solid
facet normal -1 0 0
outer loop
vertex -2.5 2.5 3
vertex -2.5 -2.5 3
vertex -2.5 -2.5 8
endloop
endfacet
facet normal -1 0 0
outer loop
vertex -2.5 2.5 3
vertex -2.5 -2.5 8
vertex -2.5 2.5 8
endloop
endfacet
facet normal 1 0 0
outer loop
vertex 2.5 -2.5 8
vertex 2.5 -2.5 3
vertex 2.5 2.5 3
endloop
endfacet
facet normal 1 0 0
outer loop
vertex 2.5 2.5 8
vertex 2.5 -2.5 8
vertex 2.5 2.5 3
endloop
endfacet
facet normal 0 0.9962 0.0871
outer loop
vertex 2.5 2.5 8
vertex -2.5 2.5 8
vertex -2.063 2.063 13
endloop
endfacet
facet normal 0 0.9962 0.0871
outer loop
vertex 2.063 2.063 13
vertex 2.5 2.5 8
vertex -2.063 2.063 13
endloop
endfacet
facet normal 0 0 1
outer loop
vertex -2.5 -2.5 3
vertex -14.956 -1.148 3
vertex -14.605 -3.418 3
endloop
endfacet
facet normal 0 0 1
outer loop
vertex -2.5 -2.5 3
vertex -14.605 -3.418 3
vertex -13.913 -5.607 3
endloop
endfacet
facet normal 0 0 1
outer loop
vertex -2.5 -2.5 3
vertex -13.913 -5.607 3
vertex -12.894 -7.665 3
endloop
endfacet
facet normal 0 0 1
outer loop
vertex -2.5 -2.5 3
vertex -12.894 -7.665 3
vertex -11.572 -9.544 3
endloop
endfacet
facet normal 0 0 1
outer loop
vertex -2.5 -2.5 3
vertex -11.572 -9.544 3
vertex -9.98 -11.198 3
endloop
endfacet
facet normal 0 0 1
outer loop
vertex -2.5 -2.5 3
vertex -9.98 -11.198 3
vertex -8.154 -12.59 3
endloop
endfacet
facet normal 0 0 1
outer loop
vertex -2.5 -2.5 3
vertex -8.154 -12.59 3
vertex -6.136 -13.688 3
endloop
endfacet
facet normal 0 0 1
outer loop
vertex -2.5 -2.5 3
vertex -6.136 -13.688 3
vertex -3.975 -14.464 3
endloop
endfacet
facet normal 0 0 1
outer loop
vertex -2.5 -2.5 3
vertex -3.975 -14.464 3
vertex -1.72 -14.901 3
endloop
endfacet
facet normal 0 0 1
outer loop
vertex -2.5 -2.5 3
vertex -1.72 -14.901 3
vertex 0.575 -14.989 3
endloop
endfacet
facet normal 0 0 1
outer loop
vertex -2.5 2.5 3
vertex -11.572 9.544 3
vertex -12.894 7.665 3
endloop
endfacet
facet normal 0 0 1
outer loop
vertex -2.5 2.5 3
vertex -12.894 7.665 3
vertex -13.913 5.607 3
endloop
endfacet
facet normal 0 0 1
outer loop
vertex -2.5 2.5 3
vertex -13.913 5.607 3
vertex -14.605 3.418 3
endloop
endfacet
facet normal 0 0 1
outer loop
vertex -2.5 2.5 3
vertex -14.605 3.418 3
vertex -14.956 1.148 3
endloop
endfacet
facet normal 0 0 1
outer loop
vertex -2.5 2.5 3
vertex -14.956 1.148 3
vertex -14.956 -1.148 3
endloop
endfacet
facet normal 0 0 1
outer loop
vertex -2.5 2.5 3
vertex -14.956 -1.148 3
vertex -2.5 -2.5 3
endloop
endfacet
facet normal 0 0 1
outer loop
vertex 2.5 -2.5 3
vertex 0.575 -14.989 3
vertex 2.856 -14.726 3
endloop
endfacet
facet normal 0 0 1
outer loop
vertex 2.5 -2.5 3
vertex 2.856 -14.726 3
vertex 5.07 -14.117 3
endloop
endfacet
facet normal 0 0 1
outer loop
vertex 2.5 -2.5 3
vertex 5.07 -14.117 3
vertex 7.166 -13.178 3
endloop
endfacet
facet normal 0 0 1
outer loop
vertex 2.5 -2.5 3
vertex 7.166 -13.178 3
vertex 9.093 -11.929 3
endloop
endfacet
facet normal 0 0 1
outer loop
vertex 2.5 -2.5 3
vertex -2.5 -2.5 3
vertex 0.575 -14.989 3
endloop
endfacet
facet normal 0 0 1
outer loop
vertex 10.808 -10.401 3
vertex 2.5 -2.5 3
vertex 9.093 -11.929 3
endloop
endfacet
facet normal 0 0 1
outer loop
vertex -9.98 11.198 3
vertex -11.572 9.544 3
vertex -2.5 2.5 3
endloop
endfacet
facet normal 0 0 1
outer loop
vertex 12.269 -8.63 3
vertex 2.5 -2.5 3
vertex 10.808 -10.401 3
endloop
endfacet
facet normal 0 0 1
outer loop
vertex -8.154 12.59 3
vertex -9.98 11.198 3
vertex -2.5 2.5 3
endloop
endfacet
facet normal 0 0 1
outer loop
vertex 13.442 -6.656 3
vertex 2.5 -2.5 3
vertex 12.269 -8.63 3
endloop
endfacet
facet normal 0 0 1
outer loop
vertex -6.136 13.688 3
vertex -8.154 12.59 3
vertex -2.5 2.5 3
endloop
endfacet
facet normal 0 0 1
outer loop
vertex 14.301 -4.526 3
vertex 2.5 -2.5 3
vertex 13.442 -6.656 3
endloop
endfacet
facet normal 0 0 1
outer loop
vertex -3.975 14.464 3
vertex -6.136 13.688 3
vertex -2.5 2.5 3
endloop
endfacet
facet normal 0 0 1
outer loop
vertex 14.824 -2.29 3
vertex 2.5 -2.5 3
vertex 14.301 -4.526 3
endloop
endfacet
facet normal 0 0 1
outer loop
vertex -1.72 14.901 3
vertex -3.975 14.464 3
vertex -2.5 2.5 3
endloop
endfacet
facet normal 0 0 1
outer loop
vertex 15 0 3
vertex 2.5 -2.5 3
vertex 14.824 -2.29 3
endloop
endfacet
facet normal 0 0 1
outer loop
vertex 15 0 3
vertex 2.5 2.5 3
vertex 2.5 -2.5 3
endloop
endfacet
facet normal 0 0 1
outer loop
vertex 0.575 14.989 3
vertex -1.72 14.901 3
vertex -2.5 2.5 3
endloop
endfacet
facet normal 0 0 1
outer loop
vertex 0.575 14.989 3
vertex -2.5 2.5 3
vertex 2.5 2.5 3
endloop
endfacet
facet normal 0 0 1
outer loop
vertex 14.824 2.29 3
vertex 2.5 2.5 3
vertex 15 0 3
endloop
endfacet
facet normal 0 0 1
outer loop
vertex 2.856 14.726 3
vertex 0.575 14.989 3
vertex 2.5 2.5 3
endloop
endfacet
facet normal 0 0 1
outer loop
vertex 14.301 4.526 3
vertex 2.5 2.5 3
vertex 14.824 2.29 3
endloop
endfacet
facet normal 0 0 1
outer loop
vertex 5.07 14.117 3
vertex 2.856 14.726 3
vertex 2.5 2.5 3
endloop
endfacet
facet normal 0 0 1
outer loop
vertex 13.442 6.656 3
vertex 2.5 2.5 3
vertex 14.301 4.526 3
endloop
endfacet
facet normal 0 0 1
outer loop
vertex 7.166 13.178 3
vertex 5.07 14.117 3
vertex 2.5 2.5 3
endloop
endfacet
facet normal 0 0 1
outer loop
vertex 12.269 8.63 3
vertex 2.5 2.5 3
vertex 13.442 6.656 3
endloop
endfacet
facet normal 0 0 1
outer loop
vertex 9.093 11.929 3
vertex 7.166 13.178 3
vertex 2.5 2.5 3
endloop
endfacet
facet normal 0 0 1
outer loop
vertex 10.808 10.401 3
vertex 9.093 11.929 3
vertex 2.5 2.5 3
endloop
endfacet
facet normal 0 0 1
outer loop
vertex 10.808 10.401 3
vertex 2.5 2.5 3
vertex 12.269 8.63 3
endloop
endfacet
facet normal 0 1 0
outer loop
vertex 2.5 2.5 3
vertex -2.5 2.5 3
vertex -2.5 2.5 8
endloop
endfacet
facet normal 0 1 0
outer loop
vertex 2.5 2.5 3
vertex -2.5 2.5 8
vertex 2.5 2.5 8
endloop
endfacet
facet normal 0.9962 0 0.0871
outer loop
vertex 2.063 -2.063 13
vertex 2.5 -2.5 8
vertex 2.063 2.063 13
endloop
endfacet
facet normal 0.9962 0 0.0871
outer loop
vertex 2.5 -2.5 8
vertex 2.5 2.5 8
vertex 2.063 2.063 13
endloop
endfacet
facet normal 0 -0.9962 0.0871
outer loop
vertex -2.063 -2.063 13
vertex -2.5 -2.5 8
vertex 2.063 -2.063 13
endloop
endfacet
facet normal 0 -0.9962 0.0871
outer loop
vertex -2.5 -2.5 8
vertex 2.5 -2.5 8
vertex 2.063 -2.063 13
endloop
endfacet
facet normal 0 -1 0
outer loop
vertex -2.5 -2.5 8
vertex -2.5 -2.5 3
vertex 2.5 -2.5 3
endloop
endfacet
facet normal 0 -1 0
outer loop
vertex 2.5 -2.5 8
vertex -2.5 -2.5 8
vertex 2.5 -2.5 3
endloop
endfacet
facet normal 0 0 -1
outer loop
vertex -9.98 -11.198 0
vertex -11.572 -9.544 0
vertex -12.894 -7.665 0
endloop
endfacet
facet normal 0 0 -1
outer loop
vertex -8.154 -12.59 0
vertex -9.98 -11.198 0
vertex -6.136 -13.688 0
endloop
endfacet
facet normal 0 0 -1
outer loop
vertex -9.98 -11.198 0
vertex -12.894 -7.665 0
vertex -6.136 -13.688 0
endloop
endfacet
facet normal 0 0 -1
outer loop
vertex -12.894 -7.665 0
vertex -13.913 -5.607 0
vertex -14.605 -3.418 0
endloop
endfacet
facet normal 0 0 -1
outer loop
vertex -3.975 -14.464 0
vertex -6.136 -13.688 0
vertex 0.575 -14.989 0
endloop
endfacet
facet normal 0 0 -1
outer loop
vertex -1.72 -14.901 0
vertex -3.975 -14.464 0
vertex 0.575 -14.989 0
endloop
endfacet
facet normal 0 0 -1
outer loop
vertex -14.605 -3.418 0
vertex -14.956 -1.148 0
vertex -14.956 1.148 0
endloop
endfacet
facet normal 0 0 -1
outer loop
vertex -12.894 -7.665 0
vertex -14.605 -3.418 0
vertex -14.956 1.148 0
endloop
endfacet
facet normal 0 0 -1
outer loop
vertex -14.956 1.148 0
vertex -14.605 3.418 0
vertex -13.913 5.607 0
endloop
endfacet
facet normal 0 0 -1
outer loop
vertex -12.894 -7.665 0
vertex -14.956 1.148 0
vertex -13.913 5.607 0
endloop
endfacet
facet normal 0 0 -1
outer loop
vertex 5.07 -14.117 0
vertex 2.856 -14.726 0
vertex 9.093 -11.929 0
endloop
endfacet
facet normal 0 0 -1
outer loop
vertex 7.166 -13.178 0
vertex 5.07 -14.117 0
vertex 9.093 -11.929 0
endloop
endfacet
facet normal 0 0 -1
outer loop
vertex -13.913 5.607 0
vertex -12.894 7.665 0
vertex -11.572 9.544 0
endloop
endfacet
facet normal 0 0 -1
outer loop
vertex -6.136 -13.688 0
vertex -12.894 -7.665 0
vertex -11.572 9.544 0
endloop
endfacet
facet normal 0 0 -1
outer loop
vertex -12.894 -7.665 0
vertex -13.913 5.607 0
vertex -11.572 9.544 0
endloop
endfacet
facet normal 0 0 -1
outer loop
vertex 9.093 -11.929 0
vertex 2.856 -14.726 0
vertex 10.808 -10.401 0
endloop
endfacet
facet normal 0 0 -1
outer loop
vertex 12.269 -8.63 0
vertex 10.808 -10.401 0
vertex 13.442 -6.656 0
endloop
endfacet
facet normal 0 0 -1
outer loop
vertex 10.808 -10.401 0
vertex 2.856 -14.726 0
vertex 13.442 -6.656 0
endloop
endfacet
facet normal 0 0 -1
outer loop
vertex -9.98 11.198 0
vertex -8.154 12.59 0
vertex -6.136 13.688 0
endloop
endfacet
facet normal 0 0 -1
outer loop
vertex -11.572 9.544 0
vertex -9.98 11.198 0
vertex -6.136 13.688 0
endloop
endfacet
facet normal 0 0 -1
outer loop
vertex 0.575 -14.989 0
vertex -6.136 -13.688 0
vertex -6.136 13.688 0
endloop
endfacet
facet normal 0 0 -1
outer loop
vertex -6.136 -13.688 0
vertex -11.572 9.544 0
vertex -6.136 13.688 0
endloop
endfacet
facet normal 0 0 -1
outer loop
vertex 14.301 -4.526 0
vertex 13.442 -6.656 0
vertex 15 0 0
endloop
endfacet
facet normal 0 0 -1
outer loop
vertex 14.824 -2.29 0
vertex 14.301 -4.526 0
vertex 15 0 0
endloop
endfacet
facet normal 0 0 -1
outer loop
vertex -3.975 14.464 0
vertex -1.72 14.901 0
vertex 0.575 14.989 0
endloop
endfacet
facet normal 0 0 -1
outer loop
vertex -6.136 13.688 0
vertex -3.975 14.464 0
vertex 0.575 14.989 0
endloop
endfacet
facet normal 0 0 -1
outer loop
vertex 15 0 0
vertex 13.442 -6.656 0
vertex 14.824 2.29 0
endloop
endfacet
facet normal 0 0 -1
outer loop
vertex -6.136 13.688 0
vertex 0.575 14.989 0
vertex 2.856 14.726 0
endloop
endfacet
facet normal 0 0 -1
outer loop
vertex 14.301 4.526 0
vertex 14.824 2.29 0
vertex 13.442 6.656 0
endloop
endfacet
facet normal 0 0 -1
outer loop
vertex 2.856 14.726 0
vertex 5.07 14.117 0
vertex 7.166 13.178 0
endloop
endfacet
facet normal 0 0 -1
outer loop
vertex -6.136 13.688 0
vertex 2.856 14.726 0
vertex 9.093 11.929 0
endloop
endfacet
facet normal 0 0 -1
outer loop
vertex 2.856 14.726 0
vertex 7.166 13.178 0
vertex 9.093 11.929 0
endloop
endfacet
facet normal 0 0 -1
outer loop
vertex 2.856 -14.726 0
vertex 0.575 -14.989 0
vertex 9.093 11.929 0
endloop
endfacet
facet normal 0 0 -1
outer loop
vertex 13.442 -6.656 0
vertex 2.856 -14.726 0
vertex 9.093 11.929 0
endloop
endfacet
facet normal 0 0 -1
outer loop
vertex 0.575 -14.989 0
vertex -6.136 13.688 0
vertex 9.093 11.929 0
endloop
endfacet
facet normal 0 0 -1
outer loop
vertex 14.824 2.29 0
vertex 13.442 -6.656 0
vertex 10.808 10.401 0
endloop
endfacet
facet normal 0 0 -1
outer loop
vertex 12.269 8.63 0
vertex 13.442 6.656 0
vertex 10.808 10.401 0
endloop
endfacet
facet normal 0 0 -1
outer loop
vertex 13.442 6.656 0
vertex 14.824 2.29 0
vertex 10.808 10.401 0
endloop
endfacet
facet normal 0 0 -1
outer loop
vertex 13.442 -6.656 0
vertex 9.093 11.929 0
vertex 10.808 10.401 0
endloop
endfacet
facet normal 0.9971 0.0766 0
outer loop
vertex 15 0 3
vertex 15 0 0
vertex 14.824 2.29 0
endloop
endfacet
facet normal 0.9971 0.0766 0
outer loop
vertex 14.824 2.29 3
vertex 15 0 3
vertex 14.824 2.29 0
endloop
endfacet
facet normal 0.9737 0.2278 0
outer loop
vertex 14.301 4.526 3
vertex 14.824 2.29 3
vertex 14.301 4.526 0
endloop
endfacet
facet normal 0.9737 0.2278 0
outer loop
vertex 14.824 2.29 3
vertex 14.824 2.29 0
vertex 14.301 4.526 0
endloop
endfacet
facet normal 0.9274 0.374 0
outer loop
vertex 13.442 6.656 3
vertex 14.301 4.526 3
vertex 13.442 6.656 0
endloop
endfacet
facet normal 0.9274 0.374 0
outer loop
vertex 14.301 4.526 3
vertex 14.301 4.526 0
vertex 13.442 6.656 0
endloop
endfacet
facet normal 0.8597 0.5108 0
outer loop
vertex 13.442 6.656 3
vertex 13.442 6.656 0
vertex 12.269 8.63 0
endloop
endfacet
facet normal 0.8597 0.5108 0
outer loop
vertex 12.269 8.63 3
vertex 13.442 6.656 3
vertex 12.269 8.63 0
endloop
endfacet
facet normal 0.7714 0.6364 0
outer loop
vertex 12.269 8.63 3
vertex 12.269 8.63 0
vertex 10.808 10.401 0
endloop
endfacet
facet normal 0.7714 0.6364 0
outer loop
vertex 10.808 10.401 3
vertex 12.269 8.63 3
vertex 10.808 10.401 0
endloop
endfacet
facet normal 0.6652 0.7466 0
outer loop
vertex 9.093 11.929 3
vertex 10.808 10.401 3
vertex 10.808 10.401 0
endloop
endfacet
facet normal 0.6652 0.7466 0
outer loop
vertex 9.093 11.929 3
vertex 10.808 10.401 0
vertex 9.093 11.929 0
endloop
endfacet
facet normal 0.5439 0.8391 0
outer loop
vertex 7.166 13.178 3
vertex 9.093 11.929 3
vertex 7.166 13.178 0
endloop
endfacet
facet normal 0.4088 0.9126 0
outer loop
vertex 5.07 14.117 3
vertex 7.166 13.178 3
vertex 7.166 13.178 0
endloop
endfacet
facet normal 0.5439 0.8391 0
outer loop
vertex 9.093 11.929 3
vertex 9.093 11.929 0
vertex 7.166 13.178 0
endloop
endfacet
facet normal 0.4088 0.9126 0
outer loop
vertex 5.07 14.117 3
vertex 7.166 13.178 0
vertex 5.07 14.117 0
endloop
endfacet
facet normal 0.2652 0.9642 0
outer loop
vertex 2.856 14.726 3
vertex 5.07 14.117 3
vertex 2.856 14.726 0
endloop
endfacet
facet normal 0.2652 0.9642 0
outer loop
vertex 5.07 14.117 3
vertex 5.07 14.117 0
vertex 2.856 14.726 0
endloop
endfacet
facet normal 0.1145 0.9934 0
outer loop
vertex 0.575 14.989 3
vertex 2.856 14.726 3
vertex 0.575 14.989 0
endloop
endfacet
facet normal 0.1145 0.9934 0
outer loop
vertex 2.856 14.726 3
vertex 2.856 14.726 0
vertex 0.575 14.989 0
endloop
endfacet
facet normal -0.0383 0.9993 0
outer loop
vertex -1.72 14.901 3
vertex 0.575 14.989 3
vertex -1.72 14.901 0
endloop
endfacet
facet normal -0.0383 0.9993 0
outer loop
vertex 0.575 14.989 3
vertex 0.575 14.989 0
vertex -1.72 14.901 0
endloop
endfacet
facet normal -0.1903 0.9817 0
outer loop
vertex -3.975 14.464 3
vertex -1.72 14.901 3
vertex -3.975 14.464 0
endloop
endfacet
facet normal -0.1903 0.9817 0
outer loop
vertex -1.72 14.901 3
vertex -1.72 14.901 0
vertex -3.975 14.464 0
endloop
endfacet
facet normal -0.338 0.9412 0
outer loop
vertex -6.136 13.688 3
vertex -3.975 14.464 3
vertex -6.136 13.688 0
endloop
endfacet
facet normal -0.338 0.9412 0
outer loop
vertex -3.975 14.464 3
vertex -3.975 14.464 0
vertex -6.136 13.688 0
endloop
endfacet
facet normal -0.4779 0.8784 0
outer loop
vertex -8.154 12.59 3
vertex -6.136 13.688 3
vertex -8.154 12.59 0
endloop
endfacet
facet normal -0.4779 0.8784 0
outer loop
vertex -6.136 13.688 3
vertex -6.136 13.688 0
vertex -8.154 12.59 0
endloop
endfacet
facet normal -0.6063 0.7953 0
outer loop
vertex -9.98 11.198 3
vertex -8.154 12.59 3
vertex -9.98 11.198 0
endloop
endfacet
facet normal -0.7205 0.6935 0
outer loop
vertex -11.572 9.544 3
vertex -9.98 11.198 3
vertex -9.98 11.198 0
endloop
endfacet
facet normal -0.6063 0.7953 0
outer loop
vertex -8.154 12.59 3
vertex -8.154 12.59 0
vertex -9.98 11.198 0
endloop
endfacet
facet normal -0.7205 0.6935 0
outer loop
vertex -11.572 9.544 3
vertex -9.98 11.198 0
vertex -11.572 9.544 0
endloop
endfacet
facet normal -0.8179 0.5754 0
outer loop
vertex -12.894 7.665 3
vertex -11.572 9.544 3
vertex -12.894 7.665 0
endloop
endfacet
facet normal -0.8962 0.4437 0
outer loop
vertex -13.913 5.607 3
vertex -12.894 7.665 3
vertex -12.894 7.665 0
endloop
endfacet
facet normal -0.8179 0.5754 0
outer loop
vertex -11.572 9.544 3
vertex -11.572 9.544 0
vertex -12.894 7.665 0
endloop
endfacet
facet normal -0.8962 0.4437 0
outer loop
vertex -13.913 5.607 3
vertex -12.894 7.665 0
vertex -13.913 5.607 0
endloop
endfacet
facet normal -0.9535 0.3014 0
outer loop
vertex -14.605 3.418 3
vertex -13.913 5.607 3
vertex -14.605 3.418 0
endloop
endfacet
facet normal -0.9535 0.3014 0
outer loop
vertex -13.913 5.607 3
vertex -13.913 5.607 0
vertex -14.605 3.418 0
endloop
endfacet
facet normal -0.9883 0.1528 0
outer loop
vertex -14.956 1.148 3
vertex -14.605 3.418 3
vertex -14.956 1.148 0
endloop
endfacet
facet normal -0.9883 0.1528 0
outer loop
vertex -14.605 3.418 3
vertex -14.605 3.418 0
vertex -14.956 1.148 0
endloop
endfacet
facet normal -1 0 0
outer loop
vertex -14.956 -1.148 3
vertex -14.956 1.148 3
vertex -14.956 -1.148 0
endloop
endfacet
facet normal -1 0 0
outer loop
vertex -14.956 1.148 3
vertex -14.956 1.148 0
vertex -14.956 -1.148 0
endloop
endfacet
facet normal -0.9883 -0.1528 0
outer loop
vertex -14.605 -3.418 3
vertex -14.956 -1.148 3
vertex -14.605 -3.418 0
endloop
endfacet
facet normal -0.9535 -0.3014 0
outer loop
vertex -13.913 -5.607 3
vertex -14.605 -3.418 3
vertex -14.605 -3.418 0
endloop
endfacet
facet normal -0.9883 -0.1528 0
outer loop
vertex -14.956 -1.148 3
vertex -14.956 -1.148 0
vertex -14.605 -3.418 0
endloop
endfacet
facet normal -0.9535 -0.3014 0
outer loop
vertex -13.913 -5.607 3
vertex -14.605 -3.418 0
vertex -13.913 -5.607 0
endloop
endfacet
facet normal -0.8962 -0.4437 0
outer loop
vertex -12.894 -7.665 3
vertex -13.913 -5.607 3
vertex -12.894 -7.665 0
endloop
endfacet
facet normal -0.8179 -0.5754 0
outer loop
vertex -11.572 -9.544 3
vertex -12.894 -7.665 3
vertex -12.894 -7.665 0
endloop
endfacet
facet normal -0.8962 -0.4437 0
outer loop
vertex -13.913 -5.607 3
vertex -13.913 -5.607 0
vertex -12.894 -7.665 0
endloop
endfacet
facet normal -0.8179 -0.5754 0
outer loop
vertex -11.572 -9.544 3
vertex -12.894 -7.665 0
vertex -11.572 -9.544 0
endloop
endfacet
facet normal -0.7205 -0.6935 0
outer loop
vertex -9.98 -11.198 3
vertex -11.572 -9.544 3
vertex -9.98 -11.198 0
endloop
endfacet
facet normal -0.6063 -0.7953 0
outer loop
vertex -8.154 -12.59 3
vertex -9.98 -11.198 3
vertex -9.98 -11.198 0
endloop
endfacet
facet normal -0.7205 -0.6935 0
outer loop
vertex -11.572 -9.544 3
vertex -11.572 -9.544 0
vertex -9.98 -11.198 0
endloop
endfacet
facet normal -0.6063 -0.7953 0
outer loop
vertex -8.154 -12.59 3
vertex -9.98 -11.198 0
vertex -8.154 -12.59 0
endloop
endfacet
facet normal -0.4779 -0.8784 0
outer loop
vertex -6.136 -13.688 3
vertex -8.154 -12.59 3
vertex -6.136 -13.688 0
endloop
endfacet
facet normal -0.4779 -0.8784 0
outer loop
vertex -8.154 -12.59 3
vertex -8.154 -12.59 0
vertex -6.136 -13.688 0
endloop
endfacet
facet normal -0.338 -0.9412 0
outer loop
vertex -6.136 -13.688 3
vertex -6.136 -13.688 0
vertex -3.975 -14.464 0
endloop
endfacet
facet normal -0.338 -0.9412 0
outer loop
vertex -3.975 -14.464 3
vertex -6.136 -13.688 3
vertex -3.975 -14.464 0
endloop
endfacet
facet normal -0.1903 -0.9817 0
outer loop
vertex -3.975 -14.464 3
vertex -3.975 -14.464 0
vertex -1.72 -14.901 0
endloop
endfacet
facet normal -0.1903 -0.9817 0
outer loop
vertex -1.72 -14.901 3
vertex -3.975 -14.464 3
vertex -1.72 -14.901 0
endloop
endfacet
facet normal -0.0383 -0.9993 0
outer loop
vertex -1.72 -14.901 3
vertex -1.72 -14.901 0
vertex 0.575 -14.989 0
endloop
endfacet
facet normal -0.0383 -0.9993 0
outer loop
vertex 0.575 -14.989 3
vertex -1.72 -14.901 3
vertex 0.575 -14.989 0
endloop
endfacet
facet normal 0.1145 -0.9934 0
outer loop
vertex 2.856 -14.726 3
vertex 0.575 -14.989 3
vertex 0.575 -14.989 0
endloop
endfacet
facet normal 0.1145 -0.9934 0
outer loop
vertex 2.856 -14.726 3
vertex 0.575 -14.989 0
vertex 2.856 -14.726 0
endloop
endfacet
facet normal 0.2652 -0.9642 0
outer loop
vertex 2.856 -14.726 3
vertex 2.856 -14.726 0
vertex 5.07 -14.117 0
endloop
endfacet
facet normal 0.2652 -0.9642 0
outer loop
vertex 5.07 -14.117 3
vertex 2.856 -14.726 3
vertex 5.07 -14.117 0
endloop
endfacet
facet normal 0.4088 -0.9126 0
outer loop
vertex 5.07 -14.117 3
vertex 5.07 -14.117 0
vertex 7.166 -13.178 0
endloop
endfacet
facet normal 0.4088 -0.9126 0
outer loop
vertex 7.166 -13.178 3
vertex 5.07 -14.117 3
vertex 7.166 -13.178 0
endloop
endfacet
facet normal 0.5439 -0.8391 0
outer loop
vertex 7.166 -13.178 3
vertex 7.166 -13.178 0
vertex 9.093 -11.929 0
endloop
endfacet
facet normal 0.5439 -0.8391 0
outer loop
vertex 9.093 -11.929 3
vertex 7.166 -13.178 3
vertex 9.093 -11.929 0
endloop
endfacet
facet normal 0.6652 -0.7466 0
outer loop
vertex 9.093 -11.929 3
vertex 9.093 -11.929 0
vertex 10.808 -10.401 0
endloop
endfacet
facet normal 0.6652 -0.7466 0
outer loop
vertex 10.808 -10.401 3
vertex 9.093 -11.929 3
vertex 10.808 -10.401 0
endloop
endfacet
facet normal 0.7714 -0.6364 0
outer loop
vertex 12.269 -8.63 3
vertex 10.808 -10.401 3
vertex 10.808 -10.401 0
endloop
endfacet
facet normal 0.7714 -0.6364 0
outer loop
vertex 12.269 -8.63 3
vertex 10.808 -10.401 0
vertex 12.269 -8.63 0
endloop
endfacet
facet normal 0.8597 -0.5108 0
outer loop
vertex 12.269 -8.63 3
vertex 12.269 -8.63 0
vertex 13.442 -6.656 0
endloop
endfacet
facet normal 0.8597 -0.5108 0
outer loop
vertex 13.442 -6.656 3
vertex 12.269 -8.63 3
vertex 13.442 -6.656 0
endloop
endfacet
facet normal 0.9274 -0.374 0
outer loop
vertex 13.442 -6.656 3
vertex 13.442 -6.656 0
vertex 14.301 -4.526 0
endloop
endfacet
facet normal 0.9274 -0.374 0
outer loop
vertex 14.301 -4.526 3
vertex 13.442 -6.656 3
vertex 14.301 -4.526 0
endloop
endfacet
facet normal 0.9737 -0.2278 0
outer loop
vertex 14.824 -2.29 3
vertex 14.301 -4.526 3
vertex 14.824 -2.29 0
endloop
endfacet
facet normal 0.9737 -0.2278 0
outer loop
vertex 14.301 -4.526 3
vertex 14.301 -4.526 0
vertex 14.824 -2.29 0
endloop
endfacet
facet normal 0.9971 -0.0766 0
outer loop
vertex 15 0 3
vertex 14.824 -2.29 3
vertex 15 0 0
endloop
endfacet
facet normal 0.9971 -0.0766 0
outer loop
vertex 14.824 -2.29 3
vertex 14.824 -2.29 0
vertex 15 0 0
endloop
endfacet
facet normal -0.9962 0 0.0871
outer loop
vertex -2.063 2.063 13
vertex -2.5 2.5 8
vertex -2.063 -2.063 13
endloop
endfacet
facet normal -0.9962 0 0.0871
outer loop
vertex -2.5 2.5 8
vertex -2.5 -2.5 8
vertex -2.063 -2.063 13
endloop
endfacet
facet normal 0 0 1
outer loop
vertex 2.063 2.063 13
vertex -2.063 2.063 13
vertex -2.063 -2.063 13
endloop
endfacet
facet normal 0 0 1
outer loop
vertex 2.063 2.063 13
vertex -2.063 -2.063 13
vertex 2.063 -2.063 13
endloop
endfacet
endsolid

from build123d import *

# Parameters (mm, degrees)
F0_R      = 15
F0_W      = 5
F0_H      = 5
F1_DEPTH  = 3
F2_DEPTH  = 8
F2_FACE_W = 5
F2_FACE_H = 5
F3_DEPTH  = 5
F3_TAPER  = 5


with BuildPart() as f1:
    # F0 (on Top) → F1 (new body)
    with BuildSketch(Plane.XY):
        Circle(F0_R)
        Rectangle(F0_W, F0_H, mode=Mode.SUBTRACT)
    extrude(amount=F1_DEPTH)

    # F0 (on Top) → F2 (join)
    with BuildSketch(Plane.XY):
        Rectangle(F0_W, F0_H)
    extrude(amount=F2_DEPTH)

    # F2_face (on face) → F3 (join)
    with BuildSketch(Plane.XY.offset(8)):
        Rectangle(F2_FACE_W, F2_FACE_H)
    extrude(amount=F3_DEPTH, taper=F3_TAPER)


solid = f1.part
